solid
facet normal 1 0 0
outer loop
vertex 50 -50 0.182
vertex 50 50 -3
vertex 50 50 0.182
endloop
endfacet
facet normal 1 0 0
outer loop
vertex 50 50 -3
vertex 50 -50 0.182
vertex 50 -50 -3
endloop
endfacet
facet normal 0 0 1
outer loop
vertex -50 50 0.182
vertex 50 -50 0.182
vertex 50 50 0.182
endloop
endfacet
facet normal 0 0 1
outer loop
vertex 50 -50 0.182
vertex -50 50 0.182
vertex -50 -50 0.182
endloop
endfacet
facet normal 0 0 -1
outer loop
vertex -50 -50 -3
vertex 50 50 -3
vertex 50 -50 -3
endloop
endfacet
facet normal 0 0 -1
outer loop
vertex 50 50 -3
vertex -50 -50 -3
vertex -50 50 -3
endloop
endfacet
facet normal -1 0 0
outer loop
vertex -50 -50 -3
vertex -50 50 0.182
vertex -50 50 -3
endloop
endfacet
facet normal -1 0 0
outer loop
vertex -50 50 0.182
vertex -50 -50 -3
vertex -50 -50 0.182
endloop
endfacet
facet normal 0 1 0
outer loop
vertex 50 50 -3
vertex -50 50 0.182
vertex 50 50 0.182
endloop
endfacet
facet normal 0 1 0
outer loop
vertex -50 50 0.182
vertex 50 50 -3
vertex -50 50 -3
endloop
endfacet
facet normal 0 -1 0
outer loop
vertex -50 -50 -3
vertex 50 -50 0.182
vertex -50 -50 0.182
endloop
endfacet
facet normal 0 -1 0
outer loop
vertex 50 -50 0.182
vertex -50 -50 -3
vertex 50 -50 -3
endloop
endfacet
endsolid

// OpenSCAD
// file: _ski_fields.scad
// NZ ski fields — shared parameters and modules. See README.md.
// Heightmap is 8-bit grayscale, 0..255 mapped to elev_min..elev_max metres
// (real values in heightmap.json). Elevation source: AWS Open Data Terrain
// Tiles (Mapzen terrarium).
$fn = 64;

// User-tunable
model_size_mm     = 100;
base_thickness_mm = 3;
z_exaggeration    = 2.00;
lake_level_m      = 310;   // Lake Wakatipu surface elevation (m)

// Global snow line (m): all terrain above this elevation is capped as snow,
// everywhere on the map. The valley floor sits well below this, so it stays
// bare; every alpine massif above the line gets a cap. Raise it to expose more
// rock, lower it for more snow. (~16% of the model is above 1300 m.)
snow_line_m       = 1300;

// Heightmap constants (keep in sync with heightmap.json)
// Renderable files may override heightmap_file and px_count together to trade
// resolution for mesh size — assembly.scad uses the 128 px preview copy so its
// exported STL stays small enough for the in-browser viewer. The two must
// agree: xy_scale is derived from px_count.
heightmap_file = "heightmap.png";
px_count     = 512;
real_area_km = 35;
elev_min_m   = 278.14453125;
elev_range_m = 2028;

// Derived
xy_scale     = model_size_mm / (px_count - 1);
mm_per_metre = model_size_mm / (real_area_km * 1000);
z_mm_total   = elev_range_m * mm_per_metre * z_exaggeration;
// OpenSCAD's surface() maps an 8-bit PNG's 0..255 grey range to height 0..100
// (NOT 0..255). Divide by 100 so a full-white pixel reaches z_mm_total and the
// model achieves the stated z_exaggeration. This also makes elev_to_z() agree
// with the actual surface height, so the snow-line plane lands inside the
// terrain (a /255 divisor put the snow line above the peaks, rendering the
// snow part empty).
z_scale      = z_mm_total / 100;

function elev_to_z(e) = (e - elev_min_m) / elev_range_m * z_mm_total;

// The terrain heightfield surface (no base). Bottom sits at z = 0.
module terrain_surface() {
  scale([xy_scale, xy_scale, z_scale])
    surface(file = heightmap_file, center = true,
            invert = false, convexity = 10);
}

// The flat base slab: from the model bottom up to z = 0, where it meets the
// surface (whose floor also sits at z = 0). Its top stays below the lake water
// line, so no base material is left capping the lake.
module terrain_base() {
  translate([0, 0, -base_thickness_mm / 2])
    cube([model_size_mm, model_size_mm, base_thickness_mm], center = true);
}

module terrain_solid() {
  union() { terrain_surface(); terrain_base(); }
}

// Axis-aligned Z slab spanning the whole XY footprint (+2 mm margin).
module zslab(z_lo, z_hi) {
  translate([0, 0, (z_lo + z_hi) / 2])
    cube([model_size_mm + 2, model_size_mm + 2, z_hi - z_lo], center = true);
}

// Pure geometric mask for everything above the global snow line — no terrain
// dependency. A single Z slab spanning the whole footprint, so every massif
// that pokes above snow_line_m is captured.
module snow_mask() {
  zslab(elev_to_z(snow_line_m), z_mm_total + 2);
}

// ---- Lake (printed as a separate material) ---------------------------------
// The lake is a solid insert filling its footprint up to the water surface. Its
// bed is an estimated sloped basin: flat-deep down the middle, ramping up to the
// shoreline so the banks incline believably instead of dropping straight down.
// The bed shape is baked into lake_bed.png (a bathymetry heightfield) by
// scripts/generate_lake_bed.py — grey 255 = bed at the water surface (no lake),
// grey 0 = bed at the model bottom (full depth).
//
// Because the bed narrows with depth, the deep lake no longer spans the narrow
// neck near the SW corner, so the terrain stays a single connected piece via the
// bank beneath the neck — no separate land bridge is needed.
lake_surface_z = elev_to_z(lake_level_m);

// lake_bed.png is rendered at its own (lower) resolution; surface() lays one
// sample per pixel, so an N-px map spans 0..N-1 units. Must match
// scripts/generate_lake_bed.py --px.
lake_bed_px = 128;
lake_bed_xy_scale = model_size_mm / (lake_bed_px - 1);

// The lakebed as a solid: grey 0..255 maps to bed height over
// [-base_thickness_mm .. lake_surface_z]. Spans from the model bottom up to the
// bed; the water column is whatever lies above it. Outside the lake the bed sits
// at the water surface, so nothing is above it there.
module lakebed_solid() {
  translate([0, 0, -base_thickness_mm])
    scale([lake_bed_xy_scale, lake_bed_xy_scale,
           (lake_surface_z + base_thickness_mm) / 100])
      surface(file = "lake_bed.png", center = true,
              invert = false, convexity = 10);
}

// The lake water column: between the sloped bed and the flat water surface.
// Empty outside the lake (bed == water surface there). The water slab is clipped
// to the lakebed footprint (exactly model_size_mm), NOT the +2 mm-oversized
// zslab: beyond the bed there is nothing to subtract, which would leave a
// full-height water strip wrapping the entire model perimeter. The bed surface
// spans precisely model_size_mm, so the slab must match it.
module lake_region() {
  difference() {
    translate([0, 0, (lake_surface_z - base_thickness_mm) / 2])
      cube([model_size_mm, model_size_mm, lake_surface_z + base_thickness_mm],
           center = true);
    lakebed_solid();
  }
}

module lake_solid() { lake_region(); }

// Snow caps: the surface above the snow line (the base never reaches it).
module snow_solid() {
  intersection() { terrain_surface(); snow_mask(); }
}

// Everything that is neither lake nor snow. The lake water column is carved out
// of the terrain; the terrain keeps the bank wedge below the bed, which slopes
// up to meet the shoreline. The Manifold backend handles this heightfield
// boolean cheaply.
module terrain_part() {
  difference() { terrain_solid(); lake_region(); snow_mask(); }
}
// main file
// NZ ski fields — assembly preview: all three parts stacked into the full
// model. Blue lake, grey terrain, white snow caps. THUMBNAIL-ONLY: the
// interactive viewers no longer load assembly.stl (a monochrome STL export
// discards these colours) — they render the coloured part STLs directly as a
// composite (see nz-ski-fields/meta.json "assembly"). This file exists purely
// as the gallery thumbnail source, so it renders Z-up (no rotate) — that lets
// OpenSCAD's default thumbnail camera look down onto the terrain and the
// blue/grey/white read clearly, instead of edge-on. Modules come from
// _ski_fields.scad and are unrotated there.
include <_ski_fields.scad>

// Preview-resolution override: this file is a viewing aid, not a printable
// part, so it renders from the 128 px copy of the heightmap. The full-res
// (512 px) assembly produced a ~100 MB-class STL that crashed browsers on the
// viewer page, and took ~31 min to render in CI. heightmap_preview.png is
// heightmap.png downsampled with Pillow (Image.LANCZOS); regenerate with:
//   python3 -c "from PIL import Image; Image.open('heightmap.png')
//     .resize((128, 128), Image.LANCZOS).save('heightmap_preview.png')"
heightmap_file = "heightmap_preview.png";
px_count = 128;

color("#64b5f6") lake_solid();     // Blue  (filament palette "Blue")
color("#9e9e9e") terrain_part();   // Grey  (filament palette "Grey")
color("#f5f5f5") snow_solid();     // White (filament palette "White")
